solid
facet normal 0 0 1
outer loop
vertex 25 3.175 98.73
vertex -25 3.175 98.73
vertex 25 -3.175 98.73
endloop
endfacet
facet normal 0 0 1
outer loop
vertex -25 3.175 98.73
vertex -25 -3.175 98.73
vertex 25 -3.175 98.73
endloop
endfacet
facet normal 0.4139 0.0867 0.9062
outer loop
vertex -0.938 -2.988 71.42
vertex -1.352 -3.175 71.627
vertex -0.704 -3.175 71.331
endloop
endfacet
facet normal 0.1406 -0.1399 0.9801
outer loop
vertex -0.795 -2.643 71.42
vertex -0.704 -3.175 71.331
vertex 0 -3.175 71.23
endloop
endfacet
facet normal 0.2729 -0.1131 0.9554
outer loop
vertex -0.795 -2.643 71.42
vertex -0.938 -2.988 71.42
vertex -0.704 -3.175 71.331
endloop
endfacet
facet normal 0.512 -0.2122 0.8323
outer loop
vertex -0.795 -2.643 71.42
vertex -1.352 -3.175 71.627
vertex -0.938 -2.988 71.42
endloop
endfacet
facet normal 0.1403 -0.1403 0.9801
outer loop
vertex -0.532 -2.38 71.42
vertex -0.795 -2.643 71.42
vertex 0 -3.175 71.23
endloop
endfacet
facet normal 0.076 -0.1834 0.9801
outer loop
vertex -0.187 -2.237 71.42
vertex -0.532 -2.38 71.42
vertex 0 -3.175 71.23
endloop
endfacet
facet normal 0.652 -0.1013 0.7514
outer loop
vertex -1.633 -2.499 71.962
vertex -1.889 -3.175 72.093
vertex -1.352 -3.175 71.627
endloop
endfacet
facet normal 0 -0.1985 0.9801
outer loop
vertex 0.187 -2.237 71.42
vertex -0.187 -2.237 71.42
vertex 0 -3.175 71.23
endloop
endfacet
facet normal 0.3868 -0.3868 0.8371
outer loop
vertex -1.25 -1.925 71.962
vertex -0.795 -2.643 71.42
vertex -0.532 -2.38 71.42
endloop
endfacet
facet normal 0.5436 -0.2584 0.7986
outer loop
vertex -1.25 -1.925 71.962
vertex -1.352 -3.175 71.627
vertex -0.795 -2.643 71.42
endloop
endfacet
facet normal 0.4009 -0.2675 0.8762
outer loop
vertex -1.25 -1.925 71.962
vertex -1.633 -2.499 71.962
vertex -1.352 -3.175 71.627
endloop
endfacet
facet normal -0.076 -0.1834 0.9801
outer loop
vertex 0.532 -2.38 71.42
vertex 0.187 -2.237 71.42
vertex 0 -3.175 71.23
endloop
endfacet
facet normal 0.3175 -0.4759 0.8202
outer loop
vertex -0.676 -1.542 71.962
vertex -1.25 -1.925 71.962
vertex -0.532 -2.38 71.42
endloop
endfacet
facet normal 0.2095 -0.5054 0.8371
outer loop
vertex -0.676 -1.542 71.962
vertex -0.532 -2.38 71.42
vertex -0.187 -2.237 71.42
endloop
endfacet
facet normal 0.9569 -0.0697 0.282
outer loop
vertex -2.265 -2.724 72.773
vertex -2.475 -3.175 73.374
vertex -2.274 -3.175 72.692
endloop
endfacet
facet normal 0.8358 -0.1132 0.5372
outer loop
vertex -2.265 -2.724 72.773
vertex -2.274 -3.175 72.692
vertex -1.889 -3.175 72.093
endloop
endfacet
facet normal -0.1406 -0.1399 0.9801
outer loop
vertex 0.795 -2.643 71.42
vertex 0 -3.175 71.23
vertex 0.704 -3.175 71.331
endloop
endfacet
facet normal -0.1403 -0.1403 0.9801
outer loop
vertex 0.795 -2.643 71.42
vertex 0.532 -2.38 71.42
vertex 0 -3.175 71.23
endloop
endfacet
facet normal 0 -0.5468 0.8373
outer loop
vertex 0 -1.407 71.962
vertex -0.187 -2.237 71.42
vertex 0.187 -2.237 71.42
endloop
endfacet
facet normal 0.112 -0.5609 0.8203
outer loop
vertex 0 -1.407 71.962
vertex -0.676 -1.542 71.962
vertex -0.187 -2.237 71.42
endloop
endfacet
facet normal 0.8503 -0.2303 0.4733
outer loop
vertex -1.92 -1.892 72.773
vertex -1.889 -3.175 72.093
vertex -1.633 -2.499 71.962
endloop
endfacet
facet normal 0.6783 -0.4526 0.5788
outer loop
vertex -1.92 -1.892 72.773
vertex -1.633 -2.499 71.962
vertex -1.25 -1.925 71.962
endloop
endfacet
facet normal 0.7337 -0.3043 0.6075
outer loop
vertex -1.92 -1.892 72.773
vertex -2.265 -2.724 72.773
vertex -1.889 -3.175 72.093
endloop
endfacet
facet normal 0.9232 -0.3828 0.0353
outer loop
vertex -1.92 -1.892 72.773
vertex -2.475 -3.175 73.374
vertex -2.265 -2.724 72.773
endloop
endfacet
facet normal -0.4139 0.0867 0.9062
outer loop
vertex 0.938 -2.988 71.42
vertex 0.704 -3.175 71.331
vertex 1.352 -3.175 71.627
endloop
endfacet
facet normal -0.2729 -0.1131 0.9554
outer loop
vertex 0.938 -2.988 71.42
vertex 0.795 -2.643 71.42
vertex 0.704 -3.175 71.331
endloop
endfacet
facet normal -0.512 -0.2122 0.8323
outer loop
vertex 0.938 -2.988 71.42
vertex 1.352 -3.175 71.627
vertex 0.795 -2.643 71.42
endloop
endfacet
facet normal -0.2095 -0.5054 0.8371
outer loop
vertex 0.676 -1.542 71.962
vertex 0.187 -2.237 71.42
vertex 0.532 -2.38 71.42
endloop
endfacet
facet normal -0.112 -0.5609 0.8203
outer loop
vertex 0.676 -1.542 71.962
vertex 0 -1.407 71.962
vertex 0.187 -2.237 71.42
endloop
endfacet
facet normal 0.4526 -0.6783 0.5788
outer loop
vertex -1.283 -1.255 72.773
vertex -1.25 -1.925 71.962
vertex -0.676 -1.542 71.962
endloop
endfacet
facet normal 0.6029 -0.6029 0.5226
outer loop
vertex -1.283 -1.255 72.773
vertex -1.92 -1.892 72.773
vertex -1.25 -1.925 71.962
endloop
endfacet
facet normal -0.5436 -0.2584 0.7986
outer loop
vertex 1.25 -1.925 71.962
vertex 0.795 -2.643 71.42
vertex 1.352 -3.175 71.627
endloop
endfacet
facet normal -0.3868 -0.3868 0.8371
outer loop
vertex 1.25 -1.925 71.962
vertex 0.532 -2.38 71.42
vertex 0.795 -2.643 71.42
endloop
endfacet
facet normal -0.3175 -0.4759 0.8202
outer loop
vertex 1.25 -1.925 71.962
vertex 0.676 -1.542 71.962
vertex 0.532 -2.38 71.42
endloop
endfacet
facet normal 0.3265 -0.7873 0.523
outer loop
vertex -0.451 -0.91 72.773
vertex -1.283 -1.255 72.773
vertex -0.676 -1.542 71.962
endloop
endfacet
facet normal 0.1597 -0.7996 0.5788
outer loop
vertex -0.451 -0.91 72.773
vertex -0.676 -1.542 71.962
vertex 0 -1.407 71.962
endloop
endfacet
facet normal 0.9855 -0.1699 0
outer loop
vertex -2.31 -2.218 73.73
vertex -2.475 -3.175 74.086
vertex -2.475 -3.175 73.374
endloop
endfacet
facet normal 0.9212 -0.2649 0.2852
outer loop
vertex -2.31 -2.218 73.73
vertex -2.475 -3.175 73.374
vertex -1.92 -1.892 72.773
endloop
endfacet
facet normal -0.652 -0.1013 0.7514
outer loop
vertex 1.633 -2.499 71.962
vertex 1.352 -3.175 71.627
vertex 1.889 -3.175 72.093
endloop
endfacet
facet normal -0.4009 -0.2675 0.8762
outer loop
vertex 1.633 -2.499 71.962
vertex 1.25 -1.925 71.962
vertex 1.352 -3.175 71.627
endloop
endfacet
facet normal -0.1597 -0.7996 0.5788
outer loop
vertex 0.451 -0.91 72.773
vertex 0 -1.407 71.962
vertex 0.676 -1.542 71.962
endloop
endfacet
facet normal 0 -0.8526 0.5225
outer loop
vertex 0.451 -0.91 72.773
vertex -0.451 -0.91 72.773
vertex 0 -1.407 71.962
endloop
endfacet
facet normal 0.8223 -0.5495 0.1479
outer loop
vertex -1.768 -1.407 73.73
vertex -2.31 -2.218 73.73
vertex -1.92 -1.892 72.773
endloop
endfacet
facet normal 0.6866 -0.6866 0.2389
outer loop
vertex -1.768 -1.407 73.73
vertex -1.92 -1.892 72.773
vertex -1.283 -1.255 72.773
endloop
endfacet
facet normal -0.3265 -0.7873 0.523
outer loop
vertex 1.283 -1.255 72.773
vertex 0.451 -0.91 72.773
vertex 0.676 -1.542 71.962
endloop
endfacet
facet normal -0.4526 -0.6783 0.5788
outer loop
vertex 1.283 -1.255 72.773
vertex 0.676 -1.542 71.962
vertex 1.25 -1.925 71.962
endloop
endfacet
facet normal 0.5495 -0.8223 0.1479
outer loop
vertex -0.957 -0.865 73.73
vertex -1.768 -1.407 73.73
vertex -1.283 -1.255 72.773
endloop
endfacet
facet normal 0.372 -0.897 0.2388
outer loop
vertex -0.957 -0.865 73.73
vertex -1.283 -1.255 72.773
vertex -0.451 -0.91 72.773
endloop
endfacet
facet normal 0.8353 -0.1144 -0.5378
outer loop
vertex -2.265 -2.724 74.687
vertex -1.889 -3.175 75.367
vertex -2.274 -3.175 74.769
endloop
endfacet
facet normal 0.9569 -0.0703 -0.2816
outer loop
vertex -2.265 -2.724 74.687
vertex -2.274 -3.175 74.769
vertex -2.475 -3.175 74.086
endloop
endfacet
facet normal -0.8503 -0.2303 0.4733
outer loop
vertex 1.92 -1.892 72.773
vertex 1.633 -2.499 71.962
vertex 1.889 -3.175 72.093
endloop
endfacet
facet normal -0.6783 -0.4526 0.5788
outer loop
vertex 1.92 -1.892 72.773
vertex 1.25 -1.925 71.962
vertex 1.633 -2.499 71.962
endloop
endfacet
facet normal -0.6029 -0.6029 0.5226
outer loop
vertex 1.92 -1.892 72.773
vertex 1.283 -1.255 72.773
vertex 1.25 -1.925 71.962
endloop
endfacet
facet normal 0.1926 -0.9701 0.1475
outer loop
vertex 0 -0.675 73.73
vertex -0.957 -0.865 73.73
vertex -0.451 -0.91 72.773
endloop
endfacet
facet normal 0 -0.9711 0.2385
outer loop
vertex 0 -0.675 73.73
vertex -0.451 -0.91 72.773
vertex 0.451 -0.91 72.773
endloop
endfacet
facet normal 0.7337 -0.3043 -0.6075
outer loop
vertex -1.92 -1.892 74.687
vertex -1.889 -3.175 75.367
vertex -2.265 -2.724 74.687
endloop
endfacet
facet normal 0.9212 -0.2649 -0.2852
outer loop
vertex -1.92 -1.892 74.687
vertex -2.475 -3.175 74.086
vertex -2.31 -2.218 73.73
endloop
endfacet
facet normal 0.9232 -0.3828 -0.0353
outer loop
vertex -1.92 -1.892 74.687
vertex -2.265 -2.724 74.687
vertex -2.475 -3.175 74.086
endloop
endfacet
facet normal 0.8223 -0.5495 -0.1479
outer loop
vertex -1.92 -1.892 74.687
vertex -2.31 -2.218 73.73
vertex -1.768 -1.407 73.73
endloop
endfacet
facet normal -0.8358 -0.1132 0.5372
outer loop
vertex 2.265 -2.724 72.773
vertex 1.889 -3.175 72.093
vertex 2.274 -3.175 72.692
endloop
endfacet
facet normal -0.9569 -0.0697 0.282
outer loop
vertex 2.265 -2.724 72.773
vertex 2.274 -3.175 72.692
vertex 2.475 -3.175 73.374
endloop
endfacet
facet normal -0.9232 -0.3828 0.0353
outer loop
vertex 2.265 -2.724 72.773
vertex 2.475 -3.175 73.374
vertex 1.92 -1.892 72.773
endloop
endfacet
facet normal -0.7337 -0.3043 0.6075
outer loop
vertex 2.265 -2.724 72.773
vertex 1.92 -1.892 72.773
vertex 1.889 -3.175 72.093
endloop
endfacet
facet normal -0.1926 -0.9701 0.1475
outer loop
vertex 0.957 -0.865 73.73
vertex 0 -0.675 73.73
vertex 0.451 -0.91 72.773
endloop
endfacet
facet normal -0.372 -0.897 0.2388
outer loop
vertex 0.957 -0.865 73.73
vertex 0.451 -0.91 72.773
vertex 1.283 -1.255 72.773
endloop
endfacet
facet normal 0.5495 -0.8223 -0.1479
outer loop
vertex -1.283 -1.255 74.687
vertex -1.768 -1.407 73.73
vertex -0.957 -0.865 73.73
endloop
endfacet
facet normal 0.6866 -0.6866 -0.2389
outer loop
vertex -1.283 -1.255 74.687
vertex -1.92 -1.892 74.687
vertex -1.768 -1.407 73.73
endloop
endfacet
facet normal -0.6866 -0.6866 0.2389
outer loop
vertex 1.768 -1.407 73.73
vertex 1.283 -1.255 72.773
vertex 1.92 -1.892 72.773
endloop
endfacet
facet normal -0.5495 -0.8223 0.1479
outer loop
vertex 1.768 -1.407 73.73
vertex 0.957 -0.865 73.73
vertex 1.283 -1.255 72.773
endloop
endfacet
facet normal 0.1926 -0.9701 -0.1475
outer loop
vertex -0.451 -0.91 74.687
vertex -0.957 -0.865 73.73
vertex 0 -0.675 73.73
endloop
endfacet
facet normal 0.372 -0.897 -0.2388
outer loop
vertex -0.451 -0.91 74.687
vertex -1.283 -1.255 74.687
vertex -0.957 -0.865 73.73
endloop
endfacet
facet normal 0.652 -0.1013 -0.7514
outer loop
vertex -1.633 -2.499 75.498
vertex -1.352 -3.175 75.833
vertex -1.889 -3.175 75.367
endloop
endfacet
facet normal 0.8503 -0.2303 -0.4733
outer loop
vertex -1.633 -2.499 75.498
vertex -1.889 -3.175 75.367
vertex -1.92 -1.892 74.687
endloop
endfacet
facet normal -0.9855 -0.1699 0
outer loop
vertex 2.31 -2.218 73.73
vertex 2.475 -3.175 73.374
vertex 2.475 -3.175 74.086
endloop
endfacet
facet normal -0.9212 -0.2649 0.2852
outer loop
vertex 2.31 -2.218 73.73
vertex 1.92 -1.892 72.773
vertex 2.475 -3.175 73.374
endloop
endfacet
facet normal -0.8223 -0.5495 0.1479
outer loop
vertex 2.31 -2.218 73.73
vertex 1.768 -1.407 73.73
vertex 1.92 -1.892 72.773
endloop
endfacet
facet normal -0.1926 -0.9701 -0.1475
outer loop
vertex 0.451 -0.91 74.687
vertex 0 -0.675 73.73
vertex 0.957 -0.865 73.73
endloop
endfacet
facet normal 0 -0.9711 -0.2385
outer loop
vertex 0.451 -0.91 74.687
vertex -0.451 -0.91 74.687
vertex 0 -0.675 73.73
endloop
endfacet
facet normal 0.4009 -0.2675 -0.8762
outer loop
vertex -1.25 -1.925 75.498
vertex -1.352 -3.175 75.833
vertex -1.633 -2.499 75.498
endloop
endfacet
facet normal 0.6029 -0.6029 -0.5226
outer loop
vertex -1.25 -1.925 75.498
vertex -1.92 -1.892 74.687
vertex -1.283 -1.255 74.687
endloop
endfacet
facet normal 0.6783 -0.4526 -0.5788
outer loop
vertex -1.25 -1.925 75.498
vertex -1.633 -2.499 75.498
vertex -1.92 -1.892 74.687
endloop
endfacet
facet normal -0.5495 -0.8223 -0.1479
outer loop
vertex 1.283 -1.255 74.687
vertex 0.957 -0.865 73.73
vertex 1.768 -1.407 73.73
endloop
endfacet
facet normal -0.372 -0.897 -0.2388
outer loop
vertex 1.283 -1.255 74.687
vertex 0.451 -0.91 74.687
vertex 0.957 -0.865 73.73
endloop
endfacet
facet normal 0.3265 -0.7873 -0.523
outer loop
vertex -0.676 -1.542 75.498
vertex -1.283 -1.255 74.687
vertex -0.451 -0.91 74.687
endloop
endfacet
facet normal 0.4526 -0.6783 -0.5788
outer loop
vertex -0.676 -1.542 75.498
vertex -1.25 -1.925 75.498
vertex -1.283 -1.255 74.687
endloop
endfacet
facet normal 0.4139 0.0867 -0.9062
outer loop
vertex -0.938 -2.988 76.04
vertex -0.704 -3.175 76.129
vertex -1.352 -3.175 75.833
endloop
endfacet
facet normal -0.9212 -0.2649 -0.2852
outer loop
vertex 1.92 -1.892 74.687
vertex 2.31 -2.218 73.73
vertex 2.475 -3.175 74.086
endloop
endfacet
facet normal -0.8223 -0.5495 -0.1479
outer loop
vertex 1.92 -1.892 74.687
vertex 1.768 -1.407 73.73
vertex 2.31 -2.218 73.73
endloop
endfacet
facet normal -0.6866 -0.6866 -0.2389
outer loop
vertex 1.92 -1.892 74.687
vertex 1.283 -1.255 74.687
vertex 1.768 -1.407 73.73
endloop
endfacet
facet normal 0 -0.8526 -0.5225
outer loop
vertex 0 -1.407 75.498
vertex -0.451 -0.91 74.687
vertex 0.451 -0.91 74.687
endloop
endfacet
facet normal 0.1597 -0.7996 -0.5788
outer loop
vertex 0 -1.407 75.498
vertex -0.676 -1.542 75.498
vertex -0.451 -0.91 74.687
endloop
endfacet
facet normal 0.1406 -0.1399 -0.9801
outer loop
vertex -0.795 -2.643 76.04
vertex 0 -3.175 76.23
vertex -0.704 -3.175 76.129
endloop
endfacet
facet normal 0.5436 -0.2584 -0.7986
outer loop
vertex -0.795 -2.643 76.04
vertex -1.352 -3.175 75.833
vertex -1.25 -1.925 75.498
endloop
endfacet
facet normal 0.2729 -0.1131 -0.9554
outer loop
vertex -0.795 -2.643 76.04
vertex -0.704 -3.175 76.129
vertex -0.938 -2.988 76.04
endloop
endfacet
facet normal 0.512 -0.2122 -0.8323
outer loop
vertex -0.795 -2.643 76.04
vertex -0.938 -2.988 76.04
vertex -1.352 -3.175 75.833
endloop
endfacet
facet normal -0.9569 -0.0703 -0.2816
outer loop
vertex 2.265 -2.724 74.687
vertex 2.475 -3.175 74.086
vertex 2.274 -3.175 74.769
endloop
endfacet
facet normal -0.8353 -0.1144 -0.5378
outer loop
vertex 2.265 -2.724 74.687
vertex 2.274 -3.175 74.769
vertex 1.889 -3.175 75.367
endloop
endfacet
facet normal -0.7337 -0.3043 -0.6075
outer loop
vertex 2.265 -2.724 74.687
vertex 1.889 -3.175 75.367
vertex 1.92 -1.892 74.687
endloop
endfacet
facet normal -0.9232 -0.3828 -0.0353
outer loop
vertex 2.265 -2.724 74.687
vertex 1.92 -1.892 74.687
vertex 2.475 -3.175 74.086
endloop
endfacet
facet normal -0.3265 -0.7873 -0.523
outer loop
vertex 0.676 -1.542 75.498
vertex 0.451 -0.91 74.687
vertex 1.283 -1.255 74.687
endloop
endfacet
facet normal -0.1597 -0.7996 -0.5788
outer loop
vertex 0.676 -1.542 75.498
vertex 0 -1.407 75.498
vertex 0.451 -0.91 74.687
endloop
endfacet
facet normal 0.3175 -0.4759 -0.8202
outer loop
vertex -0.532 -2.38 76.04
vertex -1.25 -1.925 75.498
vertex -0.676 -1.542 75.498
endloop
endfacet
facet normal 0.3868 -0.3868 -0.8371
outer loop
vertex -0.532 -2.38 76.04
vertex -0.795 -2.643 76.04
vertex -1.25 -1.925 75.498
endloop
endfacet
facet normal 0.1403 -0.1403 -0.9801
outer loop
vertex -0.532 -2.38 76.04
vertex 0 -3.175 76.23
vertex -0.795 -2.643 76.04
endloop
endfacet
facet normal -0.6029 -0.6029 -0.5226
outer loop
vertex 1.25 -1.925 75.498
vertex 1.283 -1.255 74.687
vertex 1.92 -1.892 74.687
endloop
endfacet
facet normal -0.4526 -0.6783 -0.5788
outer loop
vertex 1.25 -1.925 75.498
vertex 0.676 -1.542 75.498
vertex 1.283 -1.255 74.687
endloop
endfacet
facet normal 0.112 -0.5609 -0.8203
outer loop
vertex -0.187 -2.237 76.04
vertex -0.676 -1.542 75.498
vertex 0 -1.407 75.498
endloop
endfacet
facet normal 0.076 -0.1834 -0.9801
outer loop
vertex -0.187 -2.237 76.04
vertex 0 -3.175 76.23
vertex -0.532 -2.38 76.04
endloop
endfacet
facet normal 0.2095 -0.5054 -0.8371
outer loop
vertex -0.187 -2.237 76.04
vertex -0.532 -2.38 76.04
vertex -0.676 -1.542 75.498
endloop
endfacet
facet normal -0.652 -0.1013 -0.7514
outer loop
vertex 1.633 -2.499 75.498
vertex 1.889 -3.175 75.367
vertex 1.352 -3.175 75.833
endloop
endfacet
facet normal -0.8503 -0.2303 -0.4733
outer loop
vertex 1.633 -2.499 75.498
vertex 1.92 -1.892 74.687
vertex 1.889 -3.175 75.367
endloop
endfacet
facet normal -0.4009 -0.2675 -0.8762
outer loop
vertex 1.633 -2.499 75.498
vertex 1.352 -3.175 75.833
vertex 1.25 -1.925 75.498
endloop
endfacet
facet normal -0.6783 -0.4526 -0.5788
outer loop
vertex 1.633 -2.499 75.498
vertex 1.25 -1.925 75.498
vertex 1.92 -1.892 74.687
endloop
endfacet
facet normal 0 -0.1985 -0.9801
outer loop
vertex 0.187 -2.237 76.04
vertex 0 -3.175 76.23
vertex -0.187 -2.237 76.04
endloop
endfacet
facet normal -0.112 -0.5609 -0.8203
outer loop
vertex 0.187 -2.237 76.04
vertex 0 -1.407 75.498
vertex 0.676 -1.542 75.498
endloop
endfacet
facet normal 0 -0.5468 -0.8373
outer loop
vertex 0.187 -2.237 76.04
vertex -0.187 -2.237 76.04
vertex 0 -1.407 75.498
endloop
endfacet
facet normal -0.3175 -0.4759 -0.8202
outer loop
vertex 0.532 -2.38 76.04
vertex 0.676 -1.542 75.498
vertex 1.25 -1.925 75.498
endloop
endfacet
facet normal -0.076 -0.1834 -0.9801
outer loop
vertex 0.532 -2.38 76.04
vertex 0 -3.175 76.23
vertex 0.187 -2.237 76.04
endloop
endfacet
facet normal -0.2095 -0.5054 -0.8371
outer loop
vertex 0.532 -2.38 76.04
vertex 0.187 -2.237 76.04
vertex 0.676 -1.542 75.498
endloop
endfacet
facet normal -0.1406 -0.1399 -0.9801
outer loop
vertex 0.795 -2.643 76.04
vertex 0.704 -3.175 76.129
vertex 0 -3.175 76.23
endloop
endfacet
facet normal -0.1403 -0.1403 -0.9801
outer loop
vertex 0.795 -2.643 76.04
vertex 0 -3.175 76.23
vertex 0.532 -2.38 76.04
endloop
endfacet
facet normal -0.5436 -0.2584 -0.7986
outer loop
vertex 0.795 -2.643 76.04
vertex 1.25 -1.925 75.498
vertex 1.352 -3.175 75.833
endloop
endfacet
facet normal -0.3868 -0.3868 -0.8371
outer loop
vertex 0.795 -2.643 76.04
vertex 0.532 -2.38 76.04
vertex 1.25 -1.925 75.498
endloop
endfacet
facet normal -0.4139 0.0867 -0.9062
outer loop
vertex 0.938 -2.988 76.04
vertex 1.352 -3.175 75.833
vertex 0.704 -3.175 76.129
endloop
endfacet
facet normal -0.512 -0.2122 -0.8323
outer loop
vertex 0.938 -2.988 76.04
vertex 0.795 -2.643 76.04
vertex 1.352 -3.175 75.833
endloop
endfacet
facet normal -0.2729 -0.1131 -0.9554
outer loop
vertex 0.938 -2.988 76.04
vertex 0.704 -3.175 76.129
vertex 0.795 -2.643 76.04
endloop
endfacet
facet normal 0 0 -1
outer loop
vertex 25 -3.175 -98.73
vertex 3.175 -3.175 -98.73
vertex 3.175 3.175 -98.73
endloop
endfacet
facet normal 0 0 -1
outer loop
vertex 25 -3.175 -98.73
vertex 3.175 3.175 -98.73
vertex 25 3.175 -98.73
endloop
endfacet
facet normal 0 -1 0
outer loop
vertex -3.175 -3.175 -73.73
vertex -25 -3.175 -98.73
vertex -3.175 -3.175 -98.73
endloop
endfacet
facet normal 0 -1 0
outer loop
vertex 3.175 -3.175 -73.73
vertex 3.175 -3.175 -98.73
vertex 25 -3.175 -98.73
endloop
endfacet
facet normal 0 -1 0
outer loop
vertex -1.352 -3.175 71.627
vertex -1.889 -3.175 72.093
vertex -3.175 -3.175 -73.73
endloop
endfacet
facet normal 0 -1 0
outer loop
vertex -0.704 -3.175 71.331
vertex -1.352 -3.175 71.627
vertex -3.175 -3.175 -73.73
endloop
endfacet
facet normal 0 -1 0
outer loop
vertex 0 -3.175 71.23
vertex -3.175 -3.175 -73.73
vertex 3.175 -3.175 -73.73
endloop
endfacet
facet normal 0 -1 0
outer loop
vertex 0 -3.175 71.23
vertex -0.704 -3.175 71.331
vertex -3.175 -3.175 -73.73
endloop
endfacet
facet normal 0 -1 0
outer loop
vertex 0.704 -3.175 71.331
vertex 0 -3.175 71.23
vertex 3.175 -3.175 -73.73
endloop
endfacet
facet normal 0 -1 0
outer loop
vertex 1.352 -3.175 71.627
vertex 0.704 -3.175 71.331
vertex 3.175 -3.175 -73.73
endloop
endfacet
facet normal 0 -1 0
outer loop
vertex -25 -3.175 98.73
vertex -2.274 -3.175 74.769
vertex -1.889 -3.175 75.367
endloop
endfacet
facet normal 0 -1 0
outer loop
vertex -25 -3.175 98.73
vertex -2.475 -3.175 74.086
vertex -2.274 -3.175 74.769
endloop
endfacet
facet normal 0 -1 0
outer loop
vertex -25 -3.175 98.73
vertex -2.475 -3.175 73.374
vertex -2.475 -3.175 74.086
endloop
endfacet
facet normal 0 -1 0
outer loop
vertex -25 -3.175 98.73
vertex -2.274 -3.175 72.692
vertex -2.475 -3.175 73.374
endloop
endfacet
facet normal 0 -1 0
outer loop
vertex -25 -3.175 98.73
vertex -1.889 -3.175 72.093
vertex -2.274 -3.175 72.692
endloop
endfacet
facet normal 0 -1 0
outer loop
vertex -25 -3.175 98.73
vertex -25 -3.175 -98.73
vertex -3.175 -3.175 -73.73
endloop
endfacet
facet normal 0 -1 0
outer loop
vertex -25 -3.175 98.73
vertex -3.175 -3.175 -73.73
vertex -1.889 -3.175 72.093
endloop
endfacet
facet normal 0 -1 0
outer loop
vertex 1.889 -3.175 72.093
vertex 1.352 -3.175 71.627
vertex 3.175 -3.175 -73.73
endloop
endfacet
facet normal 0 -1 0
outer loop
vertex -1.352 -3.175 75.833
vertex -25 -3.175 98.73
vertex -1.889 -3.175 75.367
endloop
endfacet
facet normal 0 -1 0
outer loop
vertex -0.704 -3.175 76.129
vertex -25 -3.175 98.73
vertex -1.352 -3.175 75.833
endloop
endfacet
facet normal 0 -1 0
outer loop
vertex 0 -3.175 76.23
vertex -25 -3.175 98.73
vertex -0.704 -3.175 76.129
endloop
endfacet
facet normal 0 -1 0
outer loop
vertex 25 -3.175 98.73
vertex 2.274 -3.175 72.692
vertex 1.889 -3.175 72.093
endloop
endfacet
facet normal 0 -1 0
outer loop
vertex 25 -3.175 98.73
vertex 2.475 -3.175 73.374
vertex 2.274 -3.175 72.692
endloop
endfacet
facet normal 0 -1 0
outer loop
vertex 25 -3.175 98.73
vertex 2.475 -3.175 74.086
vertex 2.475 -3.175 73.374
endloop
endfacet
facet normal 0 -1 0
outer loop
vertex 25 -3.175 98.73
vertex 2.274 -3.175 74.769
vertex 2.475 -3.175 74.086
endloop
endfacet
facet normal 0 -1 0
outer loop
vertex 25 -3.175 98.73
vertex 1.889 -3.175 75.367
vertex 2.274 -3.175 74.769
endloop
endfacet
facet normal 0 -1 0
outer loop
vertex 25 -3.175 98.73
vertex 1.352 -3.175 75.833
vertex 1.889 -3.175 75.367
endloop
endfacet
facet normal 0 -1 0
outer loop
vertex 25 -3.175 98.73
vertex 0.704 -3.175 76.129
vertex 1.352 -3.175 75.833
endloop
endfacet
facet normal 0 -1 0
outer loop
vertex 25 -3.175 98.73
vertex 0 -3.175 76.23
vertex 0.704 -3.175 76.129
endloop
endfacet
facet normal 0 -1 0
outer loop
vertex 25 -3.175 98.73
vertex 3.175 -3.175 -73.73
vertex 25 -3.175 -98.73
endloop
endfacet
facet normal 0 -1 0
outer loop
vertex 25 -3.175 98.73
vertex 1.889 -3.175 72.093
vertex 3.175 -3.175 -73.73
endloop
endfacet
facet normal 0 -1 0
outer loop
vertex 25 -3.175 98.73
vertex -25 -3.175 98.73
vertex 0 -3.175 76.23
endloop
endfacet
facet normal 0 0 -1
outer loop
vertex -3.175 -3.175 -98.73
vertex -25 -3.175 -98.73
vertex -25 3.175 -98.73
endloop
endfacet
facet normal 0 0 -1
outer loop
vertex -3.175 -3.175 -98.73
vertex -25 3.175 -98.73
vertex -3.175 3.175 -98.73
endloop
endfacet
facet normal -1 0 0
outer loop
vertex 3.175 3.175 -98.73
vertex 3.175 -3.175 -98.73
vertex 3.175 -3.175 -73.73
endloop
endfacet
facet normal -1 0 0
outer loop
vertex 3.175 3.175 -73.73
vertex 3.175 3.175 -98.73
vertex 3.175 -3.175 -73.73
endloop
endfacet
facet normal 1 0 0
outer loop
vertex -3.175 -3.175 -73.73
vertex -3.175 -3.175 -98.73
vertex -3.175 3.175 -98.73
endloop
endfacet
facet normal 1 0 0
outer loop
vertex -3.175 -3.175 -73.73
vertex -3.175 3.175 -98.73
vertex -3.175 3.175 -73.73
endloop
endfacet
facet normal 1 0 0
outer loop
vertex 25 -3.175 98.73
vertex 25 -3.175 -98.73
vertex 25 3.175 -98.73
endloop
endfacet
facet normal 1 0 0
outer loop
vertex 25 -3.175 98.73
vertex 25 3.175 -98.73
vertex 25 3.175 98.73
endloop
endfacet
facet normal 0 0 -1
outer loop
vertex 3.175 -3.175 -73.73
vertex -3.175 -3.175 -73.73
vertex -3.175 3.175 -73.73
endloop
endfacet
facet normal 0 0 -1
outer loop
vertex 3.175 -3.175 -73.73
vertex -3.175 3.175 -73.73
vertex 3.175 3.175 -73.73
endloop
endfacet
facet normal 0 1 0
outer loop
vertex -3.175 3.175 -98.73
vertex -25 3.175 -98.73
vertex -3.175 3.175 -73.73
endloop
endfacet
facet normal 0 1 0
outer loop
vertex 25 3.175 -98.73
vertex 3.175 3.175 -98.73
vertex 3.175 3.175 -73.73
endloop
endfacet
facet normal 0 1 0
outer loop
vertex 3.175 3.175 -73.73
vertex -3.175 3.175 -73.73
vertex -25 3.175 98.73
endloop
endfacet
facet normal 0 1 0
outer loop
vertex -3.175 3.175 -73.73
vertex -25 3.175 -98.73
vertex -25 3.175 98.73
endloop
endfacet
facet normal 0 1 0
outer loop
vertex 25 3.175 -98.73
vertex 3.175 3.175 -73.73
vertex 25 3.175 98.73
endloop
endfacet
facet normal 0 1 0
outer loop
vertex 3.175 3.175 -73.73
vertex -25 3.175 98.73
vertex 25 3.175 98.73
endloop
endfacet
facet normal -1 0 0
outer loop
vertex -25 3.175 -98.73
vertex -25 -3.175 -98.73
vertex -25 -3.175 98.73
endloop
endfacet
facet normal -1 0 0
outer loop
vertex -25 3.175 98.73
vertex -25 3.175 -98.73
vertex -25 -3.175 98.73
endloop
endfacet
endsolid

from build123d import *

# Parameters (mm, degrees)
F0_W     = 50
F0_H     = 197.460108
F1_DEPTH = 3.175
F4_W     = 6.35
F4_H     = 25
F5_DEPTH = 6.351


with BuildPart() as f1:
    # F0 (on Front) → F1 (new body, symmetric)
    with BuildSketch(Plane.XZ):
        Rectangle(F0_W, F0_H)
    extrude(amount=F1_DEPTH, both=True)

    # F2 (on face) → F3 (revolve, cut)
    with BuildSketch(Plane.XZ.offset(3.175)):
        with BuildLine():
            ThreePointArc((0, 71.230054), (2.5, 73.730054), (0, 76.230054))
            Line((0, 76.230054), (0, 71.230054))
        make_face()
    revolve(axis=Axis((0, -3.175, 73.730054), (0, 0, -1)), mode=Mode.SUBTRACT)

    # F4 (on face) → F5 (cut, through all)
    with BuildSketch(Plane.XZ.offset(3.175)):
        with Locations((0, -86.230054)):
            Rectangle(F4_W, F4_H)
    extrude(amount=-F5_DEPTH, mode=Mode.SUBTRACT)


solid = f1.part
